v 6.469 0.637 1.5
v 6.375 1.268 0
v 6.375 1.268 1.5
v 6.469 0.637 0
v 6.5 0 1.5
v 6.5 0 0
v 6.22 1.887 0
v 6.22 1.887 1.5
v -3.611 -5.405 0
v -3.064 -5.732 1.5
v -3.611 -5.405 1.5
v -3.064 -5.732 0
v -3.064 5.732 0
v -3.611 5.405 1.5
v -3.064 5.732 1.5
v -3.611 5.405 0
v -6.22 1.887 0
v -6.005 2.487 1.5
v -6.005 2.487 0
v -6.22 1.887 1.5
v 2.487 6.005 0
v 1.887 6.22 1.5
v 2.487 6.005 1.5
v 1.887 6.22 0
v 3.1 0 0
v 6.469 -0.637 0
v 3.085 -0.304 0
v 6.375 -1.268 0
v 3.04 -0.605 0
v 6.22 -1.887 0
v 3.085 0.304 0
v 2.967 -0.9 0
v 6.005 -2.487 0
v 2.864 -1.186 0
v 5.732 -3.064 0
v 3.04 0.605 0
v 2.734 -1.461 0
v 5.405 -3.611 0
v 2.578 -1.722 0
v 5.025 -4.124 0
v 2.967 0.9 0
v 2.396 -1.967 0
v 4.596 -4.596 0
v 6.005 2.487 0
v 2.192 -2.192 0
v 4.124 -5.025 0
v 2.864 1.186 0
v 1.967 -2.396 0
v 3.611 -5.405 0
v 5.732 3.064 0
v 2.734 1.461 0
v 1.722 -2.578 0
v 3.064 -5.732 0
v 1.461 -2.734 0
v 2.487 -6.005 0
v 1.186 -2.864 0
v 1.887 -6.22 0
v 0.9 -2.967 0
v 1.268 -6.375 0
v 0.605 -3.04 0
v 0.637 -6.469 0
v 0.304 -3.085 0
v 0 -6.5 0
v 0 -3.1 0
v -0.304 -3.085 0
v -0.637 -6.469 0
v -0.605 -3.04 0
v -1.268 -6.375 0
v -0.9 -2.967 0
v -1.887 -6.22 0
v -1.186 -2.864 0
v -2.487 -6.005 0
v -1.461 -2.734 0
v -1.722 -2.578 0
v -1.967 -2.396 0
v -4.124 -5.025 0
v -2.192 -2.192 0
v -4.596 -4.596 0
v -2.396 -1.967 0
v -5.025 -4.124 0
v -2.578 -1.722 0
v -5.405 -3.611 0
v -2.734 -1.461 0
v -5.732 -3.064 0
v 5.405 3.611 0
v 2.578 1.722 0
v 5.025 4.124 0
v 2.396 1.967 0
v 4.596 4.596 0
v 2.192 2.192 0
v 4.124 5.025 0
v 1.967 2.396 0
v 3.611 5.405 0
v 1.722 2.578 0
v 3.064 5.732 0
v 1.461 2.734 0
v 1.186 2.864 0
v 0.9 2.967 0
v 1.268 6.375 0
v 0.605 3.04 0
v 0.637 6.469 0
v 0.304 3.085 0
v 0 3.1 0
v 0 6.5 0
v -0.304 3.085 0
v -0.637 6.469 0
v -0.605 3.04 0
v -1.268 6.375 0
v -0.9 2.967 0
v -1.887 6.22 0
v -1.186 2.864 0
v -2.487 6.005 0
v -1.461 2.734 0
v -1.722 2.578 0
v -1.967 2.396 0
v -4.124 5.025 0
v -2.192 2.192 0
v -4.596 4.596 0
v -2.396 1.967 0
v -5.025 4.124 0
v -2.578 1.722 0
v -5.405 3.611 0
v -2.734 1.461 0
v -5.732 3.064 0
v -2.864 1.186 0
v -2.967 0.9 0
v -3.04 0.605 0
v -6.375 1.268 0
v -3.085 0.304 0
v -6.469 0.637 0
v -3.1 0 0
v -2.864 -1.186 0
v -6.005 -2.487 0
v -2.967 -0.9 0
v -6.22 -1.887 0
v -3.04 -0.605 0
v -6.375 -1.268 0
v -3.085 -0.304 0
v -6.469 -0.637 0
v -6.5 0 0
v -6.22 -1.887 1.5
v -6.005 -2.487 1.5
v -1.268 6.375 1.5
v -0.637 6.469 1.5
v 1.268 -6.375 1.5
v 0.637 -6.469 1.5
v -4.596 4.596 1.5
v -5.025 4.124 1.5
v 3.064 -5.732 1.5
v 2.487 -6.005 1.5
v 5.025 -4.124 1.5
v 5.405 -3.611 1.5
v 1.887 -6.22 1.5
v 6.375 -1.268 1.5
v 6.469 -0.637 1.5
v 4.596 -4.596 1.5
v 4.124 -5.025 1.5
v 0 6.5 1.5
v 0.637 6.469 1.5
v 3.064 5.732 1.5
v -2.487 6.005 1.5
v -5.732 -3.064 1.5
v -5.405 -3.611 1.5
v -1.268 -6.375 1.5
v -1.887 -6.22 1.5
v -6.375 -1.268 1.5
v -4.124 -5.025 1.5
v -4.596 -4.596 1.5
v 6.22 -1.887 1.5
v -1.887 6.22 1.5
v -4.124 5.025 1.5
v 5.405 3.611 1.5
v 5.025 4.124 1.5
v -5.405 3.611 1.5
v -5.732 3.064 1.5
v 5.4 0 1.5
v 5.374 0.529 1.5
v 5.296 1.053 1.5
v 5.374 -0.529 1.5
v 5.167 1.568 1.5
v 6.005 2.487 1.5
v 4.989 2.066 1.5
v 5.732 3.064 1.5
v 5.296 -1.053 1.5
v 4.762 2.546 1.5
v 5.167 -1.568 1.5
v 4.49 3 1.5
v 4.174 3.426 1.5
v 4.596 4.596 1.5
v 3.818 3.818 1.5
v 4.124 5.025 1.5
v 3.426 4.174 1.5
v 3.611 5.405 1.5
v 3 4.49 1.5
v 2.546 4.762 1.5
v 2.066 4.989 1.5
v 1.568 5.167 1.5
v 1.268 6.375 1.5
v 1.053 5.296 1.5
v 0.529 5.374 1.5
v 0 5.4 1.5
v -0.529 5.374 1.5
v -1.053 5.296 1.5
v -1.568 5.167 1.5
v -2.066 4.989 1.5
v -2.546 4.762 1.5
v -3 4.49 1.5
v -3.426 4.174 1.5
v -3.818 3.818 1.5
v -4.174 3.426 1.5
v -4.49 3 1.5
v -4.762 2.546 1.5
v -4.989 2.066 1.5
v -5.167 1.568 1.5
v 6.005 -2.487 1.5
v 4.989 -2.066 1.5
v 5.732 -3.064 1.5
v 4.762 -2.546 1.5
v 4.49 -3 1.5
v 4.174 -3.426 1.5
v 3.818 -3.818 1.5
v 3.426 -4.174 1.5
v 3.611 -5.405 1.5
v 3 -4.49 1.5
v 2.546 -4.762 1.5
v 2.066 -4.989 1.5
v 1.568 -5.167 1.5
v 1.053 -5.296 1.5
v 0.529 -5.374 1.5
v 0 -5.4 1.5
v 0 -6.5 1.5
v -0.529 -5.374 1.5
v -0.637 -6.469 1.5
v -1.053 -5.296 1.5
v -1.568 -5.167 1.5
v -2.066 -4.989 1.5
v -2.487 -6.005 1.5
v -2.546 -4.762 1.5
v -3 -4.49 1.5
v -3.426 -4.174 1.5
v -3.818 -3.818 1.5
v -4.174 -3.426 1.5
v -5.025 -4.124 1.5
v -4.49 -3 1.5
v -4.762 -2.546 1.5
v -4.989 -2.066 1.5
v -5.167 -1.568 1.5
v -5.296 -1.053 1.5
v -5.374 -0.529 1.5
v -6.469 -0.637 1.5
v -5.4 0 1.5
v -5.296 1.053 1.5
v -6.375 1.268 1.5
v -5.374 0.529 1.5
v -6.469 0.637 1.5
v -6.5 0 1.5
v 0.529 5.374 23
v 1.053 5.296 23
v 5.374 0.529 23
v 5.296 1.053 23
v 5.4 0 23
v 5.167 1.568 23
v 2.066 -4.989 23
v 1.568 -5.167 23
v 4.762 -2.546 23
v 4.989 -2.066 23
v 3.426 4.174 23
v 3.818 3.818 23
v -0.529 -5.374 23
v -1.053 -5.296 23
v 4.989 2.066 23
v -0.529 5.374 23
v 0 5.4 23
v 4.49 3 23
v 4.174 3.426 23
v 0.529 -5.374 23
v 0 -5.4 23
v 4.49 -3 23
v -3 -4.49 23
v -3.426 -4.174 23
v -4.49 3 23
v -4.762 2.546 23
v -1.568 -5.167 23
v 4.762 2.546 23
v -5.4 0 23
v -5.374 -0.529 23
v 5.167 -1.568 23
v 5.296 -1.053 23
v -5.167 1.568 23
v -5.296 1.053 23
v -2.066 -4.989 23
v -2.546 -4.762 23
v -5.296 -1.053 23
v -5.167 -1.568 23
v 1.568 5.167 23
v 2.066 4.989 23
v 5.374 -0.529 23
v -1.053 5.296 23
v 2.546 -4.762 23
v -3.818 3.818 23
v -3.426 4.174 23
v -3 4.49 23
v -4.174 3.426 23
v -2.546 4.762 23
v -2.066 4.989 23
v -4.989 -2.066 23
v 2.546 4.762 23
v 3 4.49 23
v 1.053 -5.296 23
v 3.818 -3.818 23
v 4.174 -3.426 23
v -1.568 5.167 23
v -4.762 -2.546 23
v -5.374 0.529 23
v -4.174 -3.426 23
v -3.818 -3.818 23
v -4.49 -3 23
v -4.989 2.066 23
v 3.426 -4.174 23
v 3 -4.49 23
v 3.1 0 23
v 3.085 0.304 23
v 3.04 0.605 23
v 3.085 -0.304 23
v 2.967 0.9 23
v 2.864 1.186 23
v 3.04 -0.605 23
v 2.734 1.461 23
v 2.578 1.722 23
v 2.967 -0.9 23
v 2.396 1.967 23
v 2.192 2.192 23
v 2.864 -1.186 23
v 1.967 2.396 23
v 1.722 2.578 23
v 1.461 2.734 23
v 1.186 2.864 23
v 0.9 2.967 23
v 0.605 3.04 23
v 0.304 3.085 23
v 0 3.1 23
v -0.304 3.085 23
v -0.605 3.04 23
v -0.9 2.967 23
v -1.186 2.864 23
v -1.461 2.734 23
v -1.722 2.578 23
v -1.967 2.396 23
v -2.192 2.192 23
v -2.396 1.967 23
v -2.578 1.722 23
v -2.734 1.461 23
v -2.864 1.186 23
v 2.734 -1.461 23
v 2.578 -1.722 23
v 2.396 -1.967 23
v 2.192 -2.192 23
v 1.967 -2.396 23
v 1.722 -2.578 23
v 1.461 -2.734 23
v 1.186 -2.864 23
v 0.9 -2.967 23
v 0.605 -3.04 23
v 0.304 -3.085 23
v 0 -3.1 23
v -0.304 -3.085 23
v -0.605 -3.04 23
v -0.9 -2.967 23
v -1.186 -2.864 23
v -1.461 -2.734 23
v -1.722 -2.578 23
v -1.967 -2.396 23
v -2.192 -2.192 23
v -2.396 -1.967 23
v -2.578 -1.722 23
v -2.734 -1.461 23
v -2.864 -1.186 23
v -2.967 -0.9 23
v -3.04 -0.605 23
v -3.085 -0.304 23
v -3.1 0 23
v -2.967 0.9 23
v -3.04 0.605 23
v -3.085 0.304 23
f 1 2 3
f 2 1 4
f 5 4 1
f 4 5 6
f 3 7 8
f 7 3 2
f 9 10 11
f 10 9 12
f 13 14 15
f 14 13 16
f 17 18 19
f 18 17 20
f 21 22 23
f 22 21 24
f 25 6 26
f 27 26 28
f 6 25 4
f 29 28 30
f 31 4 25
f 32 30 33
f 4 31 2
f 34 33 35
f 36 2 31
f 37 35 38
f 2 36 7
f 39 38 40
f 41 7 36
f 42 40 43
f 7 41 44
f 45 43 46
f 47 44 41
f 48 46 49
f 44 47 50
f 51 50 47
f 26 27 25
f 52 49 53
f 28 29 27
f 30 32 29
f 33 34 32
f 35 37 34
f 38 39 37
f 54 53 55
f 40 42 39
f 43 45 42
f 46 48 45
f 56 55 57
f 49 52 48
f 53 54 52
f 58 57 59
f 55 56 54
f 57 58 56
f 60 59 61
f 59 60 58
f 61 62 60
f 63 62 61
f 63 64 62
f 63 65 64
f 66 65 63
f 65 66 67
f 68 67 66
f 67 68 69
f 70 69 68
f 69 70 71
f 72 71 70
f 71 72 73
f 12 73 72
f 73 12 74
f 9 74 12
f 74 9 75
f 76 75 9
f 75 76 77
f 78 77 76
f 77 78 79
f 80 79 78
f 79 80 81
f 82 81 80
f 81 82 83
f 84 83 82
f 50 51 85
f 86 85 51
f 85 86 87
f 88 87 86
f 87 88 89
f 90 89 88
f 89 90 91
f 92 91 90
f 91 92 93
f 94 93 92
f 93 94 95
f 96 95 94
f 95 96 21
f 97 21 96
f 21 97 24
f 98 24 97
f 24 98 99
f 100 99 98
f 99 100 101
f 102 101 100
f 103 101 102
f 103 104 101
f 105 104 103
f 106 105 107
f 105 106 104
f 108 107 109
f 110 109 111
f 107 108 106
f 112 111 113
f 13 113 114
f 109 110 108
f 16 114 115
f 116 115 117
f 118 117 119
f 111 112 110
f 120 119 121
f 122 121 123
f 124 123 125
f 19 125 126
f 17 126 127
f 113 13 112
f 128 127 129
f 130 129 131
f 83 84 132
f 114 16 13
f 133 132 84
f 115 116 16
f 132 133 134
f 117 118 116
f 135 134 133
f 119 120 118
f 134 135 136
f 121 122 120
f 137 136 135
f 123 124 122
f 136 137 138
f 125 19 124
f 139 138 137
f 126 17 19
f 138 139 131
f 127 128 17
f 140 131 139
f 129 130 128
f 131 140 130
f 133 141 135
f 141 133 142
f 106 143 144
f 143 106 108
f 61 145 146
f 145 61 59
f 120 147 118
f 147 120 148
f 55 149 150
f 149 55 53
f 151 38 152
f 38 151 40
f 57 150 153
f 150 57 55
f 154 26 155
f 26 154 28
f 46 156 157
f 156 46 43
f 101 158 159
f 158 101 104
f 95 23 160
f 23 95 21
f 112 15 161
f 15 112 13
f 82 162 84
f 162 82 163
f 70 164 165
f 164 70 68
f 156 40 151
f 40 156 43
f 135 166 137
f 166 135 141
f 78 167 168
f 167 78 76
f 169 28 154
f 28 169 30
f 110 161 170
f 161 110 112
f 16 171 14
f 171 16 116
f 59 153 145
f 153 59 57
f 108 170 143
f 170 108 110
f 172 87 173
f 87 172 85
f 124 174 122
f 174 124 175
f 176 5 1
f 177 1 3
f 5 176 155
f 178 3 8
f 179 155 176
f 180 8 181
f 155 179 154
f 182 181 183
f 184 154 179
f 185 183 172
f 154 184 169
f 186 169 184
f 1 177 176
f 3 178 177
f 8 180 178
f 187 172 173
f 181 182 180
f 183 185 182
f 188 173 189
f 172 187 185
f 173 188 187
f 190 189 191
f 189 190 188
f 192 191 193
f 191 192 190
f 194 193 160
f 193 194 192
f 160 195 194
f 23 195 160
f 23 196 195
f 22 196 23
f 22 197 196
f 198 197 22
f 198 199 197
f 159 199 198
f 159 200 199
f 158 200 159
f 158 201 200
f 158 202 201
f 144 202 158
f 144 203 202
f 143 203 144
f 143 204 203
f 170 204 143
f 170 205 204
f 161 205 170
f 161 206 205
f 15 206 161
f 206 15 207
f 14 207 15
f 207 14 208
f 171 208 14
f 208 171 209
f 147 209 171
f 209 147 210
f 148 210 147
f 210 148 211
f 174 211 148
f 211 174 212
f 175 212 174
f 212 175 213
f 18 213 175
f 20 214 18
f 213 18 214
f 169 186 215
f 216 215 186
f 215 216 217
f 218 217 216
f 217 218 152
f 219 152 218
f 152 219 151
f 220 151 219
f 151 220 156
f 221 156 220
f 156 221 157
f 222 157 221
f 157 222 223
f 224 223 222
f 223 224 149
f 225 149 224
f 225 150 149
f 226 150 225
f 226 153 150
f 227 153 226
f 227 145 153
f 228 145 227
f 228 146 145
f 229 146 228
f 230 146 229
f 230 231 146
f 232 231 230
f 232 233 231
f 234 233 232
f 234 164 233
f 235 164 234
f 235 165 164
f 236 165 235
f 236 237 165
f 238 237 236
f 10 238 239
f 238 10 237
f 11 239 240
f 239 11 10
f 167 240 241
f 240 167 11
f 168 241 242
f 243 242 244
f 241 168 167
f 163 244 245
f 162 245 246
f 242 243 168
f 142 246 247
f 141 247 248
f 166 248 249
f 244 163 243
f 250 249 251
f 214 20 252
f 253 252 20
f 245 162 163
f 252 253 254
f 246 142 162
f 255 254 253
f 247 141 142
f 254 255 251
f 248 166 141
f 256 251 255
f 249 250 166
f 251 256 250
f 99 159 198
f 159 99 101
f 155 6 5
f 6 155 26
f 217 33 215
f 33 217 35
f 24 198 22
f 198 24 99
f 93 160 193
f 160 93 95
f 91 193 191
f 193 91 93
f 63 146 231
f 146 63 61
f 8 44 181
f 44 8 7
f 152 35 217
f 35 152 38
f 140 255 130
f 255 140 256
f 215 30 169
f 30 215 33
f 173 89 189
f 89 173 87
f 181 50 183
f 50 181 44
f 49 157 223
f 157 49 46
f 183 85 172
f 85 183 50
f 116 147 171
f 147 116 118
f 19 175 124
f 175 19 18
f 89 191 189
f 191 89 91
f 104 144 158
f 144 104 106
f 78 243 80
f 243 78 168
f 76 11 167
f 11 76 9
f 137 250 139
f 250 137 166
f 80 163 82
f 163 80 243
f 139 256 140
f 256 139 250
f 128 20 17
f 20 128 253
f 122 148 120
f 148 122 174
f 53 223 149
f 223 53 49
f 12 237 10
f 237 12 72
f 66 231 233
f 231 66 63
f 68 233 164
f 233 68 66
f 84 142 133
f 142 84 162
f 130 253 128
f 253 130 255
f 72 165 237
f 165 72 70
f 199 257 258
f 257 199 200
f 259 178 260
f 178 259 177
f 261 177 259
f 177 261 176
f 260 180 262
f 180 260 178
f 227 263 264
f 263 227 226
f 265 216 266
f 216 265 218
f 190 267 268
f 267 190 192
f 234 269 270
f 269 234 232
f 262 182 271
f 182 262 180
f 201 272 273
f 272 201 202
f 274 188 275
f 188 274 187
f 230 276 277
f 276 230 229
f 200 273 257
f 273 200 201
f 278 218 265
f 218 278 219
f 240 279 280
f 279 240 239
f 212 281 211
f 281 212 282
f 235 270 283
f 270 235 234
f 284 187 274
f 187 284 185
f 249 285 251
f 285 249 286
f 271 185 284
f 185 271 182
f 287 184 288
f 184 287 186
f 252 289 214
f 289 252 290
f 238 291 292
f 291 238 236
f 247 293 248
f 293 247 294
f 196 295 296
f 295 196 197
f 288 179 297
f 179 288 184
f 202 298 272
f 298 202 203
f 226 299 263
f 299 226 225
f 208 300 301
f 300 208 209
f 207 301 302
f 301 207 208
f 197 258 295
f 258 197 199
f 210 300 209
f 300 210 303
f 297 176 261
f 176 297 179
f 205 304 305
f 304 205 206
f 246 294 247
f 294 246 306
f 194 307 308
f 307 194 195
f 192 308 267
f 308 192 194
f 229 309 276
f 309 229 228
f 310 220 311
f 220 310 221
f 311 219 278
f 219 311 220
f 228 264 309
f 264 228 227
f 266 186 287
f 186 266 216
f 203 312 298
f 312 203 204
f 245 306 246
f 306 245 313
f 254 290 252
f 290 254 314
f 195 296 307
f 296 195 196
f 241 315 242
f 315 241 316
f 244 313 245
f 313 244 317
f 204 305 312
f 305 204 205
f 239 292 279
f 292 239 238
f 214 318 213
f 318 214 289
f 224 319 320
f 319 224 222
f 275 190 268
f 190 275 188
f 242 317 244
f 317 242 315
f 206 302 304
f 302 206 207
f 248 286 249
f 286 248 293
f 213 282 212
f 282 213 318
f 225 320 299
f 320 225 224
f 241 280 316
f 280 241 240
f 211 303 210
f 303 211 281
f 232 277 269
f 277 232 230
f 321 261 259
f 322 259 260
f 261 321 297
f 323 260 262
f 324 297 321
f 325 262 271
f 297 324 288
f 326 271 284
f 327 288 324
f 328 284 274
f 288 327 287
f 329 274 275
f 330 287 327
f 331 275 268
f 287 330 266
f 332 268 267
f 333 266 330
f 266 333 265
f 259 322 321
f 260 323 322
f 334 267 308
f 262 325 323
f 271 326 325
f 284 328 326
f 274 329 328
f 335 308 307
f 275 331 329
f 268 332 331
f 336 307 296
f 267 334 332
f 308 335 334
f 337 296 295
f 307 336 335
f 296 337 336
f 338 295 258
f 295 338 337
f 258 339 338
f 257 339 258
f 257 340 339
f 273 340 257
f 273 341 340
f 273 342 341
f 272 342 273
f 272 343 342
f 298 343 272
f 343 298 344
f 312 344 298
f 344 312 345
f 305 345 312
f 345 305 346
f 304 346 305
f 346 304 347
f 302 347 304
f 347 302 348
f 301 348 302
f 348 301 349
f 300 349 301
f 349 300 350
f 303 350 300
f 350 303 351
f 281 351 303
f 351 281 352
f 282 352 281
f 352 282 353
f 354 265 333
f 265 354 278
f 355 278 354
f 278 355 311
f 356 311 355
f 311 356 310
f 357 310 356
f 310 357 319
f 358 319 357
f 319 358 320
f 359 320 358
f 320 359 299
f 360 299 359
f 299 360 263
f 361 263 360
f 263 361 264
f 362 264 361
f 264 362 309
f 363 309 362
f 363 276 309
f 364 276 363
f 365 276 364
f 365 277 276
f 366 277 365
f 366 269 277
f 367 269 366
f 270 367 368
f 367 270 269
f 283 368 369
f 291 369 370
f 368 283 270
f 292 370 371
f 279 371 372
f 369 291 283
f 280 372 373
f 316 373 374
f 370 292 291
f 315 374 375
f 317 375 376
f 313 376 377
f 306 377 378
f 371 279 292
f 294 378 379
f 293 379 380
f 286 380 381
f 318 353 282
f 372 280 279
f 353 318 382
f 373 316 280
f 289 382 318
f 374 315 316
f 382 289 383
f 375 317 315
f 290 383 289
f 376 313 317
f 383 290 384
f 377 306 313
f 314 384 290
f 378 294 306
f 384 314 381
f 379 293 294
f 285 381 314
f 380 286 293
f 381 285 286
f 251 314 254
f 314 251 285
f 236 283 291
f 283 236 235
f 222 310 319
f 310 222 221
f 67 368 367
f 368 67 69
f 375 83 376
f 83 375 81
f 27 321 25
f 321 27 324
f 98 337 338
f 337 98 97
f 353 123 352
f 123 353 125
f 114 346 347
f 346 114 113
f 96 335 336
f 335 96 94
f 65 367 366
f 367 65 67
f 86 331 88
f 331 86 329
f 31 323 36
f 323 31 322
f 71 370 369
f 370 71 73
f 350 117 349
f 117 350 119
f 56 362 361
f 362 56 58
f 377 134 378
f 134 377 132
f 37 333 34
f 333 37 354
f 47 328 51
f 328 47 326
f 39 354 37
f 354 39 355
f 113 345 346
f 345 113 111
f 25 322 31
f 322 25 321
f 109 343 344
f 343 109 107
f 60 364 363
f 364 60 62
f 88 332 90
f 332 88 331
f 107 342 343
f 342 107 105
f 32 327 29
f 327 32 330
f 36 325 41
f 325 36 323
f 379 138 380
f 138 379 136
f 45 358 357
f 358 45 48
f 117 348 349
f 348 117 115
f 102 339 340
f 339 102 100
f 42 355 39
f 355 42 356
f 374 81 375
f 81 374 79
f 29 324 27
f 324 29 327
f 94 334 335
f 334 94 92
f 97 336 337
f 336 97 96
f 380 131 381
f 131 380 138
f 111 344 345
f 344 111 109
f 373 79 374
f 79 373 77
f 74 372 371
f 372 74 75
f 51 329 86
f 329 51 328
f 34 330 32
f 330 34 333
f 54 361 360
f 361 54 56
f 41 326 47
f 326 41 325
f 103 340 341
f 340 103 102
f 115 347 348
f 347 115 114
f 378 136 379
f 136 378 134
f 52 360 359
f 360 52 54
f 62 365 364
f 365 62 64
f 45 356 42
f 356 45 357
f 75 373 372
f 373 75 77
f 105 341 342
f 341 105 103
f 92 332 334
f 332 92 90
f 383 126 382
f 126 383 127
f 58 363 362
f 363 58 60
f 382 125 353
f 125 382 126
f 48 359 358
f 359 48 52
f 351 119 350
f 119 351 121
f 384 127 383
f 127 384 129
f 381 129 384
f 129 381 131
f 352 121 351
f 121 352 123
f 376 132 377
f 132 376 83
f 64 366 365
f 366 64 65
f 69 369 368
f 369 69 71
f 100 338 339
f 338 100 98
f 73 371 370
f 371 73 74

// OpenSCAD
// PCR Tube Adapter Sleeve - fits a 0.2mL tube into a 1.5mL rack hole.
// Print orientation: Collar on bed (z=0 to 1.5), body rises to z=21.5.

// Dimensions
collar_od = 13;
collar_t  = 1.5;
body_od   = 10.8;
body_h    = 21.5;
bore_d    = 6.2;

$fn = 64;

// Calculate total height for the main body block
total_h = collar_t + body_h;

difference() {
    // Main solid: Collar + Body
    union() {
        // Collar (lies flat on bed)
        translate([0, 0, 0]) 
            cylinder(h = collar_t, d = collar_od);
        
        // Body (rises from top of collar)
        translate([0, 0, collar_t]) 
            cylinder(h = body_h, d = body_od);
    }
    
    // Bore (straight hole through full height)
    // Extend slightly past top and bottom to ensure clean cut
    translate([0, 0, -1]) 
        cylinder(h = total_h + 2, d = bore_d);
}
